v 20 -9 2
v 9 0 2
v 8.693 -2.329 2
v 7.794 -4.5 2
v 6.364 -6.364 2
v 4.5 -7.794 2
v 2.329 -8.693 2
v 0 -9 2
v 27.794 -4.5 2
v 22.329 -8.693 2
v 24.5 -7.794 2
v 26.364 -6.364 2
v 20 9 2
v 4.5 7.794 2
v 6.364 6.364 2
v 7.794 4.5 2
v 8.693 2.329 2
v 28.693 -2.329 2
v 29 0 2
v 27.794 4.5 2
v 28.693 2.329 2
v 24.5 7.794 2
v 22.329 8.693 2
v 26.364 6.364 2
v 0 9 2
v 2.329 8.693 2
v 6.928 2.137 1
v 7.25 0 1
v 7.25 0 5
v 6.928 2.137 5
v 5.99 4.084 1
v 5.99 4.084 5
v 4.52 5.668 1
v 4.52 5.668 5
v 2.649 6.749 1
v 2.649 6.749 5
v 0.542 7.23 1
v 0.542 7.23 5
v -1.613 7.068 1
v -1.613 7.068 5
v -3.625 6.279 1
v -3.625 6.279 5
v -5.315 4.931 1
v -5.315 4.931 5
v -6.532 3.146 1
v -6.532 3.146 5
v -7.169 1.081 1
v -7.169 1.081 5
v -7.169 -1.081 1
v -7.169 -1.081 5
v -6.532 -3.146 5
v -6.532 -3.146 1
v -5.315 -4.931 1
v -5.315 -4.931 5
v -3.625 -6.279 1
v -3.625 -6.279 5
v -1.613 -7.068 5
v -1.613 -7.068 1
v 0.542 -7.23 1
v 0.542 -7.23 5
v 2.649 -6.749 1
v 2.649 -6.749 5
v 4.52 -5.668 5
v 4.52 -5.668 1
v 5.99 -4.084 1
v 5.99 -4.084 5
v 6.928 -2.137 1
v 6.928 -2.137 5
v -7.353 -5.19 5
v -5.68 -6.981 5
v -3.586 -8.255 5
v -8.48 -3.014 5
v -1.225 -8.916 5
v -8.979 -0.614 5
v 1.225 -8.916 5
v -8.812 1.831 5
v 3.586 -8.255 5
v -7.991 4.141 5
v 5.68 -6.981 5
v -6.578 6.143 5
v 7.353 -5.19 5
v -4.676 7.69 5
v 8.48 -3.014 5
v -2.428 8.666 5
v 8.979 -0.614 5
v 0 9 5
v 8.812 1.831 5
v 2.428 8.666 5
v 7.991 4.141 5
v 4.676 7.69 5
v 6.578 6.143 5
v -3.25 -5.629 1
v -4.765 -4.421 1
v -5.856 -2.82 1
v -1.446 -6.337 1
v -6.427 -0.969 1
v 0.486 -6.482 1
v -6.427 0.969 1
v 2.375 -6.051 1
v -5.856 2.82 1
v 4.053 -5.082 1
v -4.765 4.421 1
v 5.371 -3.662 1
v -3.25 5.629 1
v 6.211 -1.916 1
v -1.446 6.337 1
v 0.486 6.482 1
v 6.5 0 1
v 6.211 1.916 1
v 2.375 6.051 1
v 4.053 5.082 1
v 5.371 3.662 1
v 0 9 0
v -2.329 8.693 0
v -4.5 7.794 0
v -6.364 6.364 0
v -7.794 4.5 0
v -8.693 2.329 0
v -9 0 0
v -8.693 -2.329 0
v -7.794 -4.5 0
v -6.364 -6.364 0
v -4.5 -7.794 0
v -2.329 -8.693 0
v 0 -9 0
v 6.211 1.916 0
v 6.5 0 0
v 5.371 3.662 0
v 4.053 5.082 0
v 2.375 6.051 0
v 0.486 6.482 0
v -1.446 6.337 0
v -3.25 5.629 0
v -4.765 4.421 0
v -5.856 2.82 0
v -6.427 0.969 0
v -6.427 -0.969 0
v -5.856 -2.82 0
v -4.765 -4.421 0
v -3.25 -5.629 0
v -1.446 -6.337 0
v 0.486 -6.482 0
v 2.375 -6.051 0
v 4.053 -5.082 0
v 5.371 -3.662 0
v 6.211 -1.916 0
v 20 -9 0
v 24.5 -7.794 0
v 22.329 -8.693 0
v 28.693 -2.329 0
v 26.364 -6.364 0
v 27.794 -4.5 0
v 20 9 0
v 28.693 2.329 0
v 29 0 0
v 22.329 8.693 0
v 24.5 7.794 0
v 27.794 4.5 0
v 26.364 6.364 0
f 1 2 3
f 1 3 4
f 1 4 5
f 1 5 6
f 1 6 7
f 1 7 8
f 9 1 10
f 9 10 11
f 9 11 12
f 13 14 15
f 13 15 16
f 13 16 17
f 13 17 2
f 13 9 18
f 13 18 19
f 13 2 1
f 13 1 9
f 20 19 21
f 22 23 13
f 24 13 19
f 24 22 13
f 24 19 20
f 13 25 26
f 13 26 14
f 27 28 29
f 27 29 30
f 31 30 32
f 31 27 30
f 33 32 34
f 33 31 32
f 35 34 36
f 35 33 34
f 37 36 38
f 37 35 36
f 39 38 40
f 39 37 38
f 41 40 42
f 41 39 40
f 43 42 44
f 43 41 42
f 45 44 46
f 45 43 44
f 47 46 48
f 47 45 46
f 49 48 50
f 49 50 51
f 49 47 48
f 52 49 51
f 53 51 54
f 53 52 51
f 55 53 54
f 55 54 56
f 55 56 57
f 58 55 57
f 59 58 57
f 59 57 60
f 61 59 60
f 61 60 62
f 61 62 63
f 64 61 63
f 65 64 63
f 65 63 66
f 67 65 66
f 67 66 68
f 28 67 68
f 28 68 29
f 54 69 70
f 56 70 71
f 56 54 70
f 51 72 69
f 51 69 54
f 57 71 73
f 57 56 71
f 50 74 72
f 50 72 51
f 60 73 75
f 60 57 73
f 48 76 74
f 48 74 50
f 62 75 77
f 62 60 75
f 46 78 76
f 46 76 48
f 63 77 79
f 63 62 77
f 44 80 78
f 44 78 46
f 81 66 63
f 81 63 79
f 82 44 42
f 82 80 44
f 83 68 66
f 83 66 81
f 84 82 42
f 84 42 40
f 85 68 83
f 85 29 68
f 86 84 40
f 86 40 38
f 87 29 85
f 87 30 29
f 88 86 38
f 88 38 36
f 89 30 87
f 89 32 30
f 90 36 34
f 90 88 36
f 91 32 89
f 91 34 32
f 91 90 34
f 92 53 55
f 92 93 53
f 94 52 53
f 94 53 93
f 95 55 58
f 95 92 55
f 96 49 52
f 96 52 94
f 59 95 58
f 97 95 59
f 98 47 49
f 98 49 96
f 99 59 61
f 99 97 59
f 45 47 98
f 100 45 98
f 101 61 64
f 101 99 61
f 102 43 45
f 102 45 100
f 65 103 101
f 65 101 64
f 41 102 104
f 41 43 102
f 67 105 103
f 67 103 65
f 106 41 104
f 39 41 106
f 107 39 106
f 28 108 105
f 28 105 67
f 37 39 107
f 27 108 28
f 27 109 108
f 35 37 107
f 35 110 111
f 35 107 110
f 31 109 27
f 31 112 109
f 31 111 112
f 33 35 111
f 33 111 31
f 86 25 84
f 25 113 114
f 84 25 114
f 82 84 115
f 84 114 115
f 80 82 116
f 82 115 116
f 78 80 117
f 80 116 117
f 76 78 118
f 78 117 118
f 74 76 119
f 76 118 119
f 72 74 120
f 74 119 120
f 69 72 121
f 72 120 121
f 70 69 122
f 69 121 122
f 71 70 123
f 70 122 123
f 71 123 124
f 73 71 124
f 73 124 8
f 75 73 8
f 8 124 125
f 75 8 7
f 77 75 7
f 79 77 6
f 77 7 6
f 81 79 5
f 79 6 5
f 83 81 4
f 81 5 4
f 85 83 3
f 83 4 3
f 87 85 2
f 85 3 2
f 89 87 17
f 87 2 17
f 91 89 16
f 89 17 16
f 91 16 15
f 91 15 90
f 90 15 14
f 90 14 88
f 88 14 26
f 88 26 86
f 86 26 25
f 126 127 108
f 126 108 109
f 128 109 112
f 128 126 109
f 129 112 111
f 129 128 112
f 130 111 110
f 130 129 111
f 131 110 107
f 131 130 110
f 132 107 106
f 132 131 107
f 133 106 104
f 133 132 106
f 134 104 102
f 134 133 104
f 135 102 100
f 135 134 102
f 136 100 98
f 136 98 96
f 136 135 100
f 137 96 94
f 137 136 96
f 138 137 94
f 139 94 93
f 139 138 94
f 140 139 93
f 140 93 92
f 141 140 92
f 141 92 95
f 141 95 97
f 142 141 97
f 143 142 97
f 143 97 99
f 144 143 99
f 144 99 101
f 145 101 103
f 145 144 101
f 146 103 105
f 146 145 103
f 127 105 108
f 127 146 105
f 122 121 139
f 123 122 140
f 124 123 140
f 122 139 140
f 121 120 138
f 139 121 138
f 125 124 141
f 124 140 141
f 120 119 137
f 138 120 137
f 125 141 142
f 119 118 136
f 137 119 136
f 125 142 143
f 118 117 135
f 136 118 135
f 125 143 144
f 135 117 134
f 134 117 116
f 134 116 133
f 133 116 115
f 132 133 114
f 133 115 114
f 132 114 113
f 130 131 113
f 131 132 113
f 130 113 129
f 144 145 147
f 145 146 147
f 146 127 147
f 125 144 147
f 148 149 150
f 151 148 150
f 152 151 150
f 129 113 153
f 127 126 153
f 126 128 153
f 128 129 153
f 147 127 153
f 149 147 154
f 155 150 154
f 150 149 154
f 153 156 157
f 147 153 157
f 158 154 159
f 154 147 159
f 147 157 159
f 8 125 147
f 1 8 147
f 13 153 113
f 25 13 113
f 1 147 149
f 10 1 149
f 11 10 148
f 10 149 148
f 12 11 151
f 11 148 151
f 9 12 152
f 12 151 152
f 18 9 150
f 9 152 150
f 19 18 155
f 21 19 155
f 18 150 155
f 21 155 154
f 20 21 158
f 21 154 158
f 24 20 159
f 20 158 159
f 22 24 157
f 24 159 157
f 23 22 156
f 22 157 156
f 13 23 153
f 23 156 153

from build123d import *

# Parameters (mm, degrees)
F0_R     = 7.25
F1_DEPTH = 5
F0_R_2   = 6.5
F2_DEPTH = 1
F4_DEPTH = 3


with BuildPart() as f1:
    # F0 (on Top) → F1 (new body)
    with BuildSketch(Plane.XY):
        with BuildLine():
            Line((20, 9), (0, 9))
            ThreePointArc((0, 9), (-9, 0), (0, -9))
            Line((0, -9), (20, -9))
            ThreePointArc((20, -9), (29, 0), (20, 9))
        make_face()
        Circle(F0_R, mode=Mode.SUBTRACT)
    extrude(amount=F1_DEPTH)

    # F0 (on Top) → F2 (join)
    with BuildSketch(Plane.XY):
        Circle(F0_R)
        Circle(F0_R_2, mode=Mode.SUBTRACT)
    extrude(amount=F2_DEPTH)

    # F3 (on face) → F4 (cut)
    with BuildSketch(Plane.XY.offset(5)):
        with BuildLine():
            ThreePointArc((0, 9), (9, 0), (0, -9))
            Line((0, -9), (20, -9))
            ThreePointArc((20, -9), (29, 0), (20, 9))
            Line((20, 9), (0, 9))
        make_face()
    extrude(amount=-F4_DEPTH, mode=Mode.SUBTRACT)


solid = f1.part
